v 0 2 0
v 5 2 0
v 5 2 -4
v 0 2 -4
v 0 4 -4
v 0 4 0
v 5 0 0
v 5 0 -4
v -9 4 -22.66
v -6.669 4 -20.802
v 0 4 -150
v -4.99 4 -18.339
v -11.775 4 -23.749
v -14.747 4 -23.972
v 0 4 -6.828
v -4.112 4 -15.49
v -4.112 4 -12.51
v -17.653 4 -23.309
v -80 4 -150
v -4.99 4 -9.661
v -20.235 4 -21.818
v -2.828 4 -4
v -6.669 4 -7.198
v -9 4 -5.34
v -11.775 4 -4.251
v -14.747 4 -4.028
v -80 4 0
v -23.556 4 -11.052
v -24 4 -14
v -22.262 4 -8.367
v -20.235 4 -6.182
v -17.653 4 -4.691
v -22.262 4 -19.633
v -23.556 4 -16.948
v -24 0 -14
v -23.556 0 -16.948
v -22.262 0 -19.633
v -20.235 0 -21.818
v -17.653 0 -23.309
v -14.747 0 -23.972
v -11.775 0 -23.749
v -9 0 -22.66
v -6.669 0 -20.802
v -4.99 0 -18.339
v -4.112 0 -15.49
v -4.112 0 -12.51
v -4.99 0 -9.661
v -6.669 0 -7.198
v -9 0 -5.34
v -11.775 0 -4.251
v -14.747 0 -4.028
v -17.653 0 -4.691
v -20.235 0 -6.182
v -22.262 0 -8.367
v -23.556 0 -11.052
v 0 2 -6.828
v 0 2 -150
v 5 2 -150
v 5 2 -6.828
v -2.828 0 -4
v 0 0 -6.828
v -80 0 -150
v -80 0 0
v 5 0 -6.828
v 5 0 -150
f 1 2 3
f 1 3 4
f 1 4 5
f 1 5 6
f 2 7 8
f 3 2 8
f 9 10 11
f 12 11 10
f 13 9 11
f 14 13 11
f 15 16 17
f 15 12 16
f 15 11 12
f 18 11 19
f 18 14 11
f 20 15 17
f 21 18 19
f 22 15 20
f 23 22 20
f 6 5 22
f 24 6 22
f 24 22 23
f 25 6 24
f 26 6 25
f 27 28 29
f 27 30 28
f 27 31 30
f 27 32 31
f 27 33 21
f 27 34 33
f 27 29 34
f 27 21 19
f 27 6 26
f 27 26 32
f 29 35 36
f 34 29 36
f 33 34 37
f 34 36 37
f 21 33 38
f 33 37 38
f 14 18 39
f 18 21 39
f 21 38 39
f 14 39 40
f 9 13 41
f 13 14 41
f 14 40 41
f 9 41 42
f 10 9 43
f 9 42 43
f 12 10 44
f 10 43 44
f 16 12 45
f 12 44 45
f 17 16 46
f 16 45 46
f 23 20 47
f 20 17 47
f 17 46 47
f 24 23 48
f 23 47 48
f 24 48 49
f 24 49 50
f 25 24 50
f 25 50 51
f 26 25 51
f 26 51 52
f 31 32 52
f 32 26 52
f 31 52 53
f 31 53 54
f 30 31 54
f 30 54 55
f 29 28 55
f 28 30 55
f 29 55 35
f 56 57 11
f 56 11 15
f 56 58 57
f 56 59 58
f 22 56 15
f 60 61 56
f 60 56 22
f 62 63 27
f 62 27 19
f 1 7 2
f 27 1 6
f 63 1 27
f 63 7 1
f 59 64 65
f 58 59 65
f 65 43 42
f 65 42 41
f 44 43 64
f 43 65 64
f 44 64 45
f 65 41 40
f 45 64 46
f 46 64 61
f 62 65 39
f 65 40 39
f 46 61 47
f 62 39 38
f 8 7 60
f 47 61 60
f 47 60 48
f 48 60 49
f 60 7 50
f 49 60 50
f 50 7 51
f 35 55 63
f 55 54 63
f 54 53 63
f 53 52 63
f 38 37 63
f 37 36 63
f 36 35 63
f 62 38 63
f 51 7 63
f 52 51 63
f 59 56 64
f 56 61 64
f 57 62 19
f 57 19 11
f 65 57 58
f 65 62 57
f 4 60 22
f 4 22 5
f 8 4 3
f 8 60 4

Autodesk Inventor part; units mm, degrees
ref_plane "YZ Plane" through (0, 0, 0) normal (1, 0, 0) x (0, 1, 0)
ref_plane "XZ Plane" through (0, 0, 0) normal (0, 1, 0) x (-1, 0, 0)
ref_plane "XY Plane" through (0, 0, 0) normal (0, 0, 1) x (1, 0, 0)
sketch "Sketch1" plane through (0, 0, 0) normal (0, 1, 0) x (-1, 0, 0)
  line L0 (0, 0) -> (80, 0)
  line L1 (80, 0) -> (80, -150)
  line L2 (80, -150) -> (0, -150)
  line L3 (0, -150) -> (0, 0)
  line L4 (0, 0) -> (-5, 0)
  line L5 (-5, 0) -> (-5, -150)
  line L6 (-5, -150) -> (0, -150)
  line L7 (0, -150) -> (0, 0)
  line L8 (0, -6.8284) -> (2.8284, -4)
  circle A0 centre (14, -14) radius 10
  line L9 (2.8284, -4) -> (0, -4)
  line L10 (0, -6.8284) -> (-5, -6.8284)
  line L11 (0, -4) -> (-5, -4)
  dimension "d0" = 150
  dimension "d1" = 80
  dimension "d2" = 5
  dimension "d3" = 4
  dimension "d4" = 45
  dimension "d5" = 20
  dimension "d6" = 4
  dimension "d7" = 14
  dimension "d8" = 14
extrude "Extrusion1" add sketch "Sketch1" along normal blind 4 contours L0 L1 L2 L3 L8 L9 | L9 L8 L3
extrude "Extrusion2" cut sketch "Sketch1" along normal blind 4 contours L9 L8 L3
extrude "Extrusion3" add sketch "Sketch1" along normal blind 2 contours L3 L11 L5 L4 | L3 L10 L5 L11 | L3 L6 L5 L10
extrude "Extrusion4" cut sketch "Sketch1" along normal blind 2 contours L3 L10 L5 L11
properties part number "backWall"
